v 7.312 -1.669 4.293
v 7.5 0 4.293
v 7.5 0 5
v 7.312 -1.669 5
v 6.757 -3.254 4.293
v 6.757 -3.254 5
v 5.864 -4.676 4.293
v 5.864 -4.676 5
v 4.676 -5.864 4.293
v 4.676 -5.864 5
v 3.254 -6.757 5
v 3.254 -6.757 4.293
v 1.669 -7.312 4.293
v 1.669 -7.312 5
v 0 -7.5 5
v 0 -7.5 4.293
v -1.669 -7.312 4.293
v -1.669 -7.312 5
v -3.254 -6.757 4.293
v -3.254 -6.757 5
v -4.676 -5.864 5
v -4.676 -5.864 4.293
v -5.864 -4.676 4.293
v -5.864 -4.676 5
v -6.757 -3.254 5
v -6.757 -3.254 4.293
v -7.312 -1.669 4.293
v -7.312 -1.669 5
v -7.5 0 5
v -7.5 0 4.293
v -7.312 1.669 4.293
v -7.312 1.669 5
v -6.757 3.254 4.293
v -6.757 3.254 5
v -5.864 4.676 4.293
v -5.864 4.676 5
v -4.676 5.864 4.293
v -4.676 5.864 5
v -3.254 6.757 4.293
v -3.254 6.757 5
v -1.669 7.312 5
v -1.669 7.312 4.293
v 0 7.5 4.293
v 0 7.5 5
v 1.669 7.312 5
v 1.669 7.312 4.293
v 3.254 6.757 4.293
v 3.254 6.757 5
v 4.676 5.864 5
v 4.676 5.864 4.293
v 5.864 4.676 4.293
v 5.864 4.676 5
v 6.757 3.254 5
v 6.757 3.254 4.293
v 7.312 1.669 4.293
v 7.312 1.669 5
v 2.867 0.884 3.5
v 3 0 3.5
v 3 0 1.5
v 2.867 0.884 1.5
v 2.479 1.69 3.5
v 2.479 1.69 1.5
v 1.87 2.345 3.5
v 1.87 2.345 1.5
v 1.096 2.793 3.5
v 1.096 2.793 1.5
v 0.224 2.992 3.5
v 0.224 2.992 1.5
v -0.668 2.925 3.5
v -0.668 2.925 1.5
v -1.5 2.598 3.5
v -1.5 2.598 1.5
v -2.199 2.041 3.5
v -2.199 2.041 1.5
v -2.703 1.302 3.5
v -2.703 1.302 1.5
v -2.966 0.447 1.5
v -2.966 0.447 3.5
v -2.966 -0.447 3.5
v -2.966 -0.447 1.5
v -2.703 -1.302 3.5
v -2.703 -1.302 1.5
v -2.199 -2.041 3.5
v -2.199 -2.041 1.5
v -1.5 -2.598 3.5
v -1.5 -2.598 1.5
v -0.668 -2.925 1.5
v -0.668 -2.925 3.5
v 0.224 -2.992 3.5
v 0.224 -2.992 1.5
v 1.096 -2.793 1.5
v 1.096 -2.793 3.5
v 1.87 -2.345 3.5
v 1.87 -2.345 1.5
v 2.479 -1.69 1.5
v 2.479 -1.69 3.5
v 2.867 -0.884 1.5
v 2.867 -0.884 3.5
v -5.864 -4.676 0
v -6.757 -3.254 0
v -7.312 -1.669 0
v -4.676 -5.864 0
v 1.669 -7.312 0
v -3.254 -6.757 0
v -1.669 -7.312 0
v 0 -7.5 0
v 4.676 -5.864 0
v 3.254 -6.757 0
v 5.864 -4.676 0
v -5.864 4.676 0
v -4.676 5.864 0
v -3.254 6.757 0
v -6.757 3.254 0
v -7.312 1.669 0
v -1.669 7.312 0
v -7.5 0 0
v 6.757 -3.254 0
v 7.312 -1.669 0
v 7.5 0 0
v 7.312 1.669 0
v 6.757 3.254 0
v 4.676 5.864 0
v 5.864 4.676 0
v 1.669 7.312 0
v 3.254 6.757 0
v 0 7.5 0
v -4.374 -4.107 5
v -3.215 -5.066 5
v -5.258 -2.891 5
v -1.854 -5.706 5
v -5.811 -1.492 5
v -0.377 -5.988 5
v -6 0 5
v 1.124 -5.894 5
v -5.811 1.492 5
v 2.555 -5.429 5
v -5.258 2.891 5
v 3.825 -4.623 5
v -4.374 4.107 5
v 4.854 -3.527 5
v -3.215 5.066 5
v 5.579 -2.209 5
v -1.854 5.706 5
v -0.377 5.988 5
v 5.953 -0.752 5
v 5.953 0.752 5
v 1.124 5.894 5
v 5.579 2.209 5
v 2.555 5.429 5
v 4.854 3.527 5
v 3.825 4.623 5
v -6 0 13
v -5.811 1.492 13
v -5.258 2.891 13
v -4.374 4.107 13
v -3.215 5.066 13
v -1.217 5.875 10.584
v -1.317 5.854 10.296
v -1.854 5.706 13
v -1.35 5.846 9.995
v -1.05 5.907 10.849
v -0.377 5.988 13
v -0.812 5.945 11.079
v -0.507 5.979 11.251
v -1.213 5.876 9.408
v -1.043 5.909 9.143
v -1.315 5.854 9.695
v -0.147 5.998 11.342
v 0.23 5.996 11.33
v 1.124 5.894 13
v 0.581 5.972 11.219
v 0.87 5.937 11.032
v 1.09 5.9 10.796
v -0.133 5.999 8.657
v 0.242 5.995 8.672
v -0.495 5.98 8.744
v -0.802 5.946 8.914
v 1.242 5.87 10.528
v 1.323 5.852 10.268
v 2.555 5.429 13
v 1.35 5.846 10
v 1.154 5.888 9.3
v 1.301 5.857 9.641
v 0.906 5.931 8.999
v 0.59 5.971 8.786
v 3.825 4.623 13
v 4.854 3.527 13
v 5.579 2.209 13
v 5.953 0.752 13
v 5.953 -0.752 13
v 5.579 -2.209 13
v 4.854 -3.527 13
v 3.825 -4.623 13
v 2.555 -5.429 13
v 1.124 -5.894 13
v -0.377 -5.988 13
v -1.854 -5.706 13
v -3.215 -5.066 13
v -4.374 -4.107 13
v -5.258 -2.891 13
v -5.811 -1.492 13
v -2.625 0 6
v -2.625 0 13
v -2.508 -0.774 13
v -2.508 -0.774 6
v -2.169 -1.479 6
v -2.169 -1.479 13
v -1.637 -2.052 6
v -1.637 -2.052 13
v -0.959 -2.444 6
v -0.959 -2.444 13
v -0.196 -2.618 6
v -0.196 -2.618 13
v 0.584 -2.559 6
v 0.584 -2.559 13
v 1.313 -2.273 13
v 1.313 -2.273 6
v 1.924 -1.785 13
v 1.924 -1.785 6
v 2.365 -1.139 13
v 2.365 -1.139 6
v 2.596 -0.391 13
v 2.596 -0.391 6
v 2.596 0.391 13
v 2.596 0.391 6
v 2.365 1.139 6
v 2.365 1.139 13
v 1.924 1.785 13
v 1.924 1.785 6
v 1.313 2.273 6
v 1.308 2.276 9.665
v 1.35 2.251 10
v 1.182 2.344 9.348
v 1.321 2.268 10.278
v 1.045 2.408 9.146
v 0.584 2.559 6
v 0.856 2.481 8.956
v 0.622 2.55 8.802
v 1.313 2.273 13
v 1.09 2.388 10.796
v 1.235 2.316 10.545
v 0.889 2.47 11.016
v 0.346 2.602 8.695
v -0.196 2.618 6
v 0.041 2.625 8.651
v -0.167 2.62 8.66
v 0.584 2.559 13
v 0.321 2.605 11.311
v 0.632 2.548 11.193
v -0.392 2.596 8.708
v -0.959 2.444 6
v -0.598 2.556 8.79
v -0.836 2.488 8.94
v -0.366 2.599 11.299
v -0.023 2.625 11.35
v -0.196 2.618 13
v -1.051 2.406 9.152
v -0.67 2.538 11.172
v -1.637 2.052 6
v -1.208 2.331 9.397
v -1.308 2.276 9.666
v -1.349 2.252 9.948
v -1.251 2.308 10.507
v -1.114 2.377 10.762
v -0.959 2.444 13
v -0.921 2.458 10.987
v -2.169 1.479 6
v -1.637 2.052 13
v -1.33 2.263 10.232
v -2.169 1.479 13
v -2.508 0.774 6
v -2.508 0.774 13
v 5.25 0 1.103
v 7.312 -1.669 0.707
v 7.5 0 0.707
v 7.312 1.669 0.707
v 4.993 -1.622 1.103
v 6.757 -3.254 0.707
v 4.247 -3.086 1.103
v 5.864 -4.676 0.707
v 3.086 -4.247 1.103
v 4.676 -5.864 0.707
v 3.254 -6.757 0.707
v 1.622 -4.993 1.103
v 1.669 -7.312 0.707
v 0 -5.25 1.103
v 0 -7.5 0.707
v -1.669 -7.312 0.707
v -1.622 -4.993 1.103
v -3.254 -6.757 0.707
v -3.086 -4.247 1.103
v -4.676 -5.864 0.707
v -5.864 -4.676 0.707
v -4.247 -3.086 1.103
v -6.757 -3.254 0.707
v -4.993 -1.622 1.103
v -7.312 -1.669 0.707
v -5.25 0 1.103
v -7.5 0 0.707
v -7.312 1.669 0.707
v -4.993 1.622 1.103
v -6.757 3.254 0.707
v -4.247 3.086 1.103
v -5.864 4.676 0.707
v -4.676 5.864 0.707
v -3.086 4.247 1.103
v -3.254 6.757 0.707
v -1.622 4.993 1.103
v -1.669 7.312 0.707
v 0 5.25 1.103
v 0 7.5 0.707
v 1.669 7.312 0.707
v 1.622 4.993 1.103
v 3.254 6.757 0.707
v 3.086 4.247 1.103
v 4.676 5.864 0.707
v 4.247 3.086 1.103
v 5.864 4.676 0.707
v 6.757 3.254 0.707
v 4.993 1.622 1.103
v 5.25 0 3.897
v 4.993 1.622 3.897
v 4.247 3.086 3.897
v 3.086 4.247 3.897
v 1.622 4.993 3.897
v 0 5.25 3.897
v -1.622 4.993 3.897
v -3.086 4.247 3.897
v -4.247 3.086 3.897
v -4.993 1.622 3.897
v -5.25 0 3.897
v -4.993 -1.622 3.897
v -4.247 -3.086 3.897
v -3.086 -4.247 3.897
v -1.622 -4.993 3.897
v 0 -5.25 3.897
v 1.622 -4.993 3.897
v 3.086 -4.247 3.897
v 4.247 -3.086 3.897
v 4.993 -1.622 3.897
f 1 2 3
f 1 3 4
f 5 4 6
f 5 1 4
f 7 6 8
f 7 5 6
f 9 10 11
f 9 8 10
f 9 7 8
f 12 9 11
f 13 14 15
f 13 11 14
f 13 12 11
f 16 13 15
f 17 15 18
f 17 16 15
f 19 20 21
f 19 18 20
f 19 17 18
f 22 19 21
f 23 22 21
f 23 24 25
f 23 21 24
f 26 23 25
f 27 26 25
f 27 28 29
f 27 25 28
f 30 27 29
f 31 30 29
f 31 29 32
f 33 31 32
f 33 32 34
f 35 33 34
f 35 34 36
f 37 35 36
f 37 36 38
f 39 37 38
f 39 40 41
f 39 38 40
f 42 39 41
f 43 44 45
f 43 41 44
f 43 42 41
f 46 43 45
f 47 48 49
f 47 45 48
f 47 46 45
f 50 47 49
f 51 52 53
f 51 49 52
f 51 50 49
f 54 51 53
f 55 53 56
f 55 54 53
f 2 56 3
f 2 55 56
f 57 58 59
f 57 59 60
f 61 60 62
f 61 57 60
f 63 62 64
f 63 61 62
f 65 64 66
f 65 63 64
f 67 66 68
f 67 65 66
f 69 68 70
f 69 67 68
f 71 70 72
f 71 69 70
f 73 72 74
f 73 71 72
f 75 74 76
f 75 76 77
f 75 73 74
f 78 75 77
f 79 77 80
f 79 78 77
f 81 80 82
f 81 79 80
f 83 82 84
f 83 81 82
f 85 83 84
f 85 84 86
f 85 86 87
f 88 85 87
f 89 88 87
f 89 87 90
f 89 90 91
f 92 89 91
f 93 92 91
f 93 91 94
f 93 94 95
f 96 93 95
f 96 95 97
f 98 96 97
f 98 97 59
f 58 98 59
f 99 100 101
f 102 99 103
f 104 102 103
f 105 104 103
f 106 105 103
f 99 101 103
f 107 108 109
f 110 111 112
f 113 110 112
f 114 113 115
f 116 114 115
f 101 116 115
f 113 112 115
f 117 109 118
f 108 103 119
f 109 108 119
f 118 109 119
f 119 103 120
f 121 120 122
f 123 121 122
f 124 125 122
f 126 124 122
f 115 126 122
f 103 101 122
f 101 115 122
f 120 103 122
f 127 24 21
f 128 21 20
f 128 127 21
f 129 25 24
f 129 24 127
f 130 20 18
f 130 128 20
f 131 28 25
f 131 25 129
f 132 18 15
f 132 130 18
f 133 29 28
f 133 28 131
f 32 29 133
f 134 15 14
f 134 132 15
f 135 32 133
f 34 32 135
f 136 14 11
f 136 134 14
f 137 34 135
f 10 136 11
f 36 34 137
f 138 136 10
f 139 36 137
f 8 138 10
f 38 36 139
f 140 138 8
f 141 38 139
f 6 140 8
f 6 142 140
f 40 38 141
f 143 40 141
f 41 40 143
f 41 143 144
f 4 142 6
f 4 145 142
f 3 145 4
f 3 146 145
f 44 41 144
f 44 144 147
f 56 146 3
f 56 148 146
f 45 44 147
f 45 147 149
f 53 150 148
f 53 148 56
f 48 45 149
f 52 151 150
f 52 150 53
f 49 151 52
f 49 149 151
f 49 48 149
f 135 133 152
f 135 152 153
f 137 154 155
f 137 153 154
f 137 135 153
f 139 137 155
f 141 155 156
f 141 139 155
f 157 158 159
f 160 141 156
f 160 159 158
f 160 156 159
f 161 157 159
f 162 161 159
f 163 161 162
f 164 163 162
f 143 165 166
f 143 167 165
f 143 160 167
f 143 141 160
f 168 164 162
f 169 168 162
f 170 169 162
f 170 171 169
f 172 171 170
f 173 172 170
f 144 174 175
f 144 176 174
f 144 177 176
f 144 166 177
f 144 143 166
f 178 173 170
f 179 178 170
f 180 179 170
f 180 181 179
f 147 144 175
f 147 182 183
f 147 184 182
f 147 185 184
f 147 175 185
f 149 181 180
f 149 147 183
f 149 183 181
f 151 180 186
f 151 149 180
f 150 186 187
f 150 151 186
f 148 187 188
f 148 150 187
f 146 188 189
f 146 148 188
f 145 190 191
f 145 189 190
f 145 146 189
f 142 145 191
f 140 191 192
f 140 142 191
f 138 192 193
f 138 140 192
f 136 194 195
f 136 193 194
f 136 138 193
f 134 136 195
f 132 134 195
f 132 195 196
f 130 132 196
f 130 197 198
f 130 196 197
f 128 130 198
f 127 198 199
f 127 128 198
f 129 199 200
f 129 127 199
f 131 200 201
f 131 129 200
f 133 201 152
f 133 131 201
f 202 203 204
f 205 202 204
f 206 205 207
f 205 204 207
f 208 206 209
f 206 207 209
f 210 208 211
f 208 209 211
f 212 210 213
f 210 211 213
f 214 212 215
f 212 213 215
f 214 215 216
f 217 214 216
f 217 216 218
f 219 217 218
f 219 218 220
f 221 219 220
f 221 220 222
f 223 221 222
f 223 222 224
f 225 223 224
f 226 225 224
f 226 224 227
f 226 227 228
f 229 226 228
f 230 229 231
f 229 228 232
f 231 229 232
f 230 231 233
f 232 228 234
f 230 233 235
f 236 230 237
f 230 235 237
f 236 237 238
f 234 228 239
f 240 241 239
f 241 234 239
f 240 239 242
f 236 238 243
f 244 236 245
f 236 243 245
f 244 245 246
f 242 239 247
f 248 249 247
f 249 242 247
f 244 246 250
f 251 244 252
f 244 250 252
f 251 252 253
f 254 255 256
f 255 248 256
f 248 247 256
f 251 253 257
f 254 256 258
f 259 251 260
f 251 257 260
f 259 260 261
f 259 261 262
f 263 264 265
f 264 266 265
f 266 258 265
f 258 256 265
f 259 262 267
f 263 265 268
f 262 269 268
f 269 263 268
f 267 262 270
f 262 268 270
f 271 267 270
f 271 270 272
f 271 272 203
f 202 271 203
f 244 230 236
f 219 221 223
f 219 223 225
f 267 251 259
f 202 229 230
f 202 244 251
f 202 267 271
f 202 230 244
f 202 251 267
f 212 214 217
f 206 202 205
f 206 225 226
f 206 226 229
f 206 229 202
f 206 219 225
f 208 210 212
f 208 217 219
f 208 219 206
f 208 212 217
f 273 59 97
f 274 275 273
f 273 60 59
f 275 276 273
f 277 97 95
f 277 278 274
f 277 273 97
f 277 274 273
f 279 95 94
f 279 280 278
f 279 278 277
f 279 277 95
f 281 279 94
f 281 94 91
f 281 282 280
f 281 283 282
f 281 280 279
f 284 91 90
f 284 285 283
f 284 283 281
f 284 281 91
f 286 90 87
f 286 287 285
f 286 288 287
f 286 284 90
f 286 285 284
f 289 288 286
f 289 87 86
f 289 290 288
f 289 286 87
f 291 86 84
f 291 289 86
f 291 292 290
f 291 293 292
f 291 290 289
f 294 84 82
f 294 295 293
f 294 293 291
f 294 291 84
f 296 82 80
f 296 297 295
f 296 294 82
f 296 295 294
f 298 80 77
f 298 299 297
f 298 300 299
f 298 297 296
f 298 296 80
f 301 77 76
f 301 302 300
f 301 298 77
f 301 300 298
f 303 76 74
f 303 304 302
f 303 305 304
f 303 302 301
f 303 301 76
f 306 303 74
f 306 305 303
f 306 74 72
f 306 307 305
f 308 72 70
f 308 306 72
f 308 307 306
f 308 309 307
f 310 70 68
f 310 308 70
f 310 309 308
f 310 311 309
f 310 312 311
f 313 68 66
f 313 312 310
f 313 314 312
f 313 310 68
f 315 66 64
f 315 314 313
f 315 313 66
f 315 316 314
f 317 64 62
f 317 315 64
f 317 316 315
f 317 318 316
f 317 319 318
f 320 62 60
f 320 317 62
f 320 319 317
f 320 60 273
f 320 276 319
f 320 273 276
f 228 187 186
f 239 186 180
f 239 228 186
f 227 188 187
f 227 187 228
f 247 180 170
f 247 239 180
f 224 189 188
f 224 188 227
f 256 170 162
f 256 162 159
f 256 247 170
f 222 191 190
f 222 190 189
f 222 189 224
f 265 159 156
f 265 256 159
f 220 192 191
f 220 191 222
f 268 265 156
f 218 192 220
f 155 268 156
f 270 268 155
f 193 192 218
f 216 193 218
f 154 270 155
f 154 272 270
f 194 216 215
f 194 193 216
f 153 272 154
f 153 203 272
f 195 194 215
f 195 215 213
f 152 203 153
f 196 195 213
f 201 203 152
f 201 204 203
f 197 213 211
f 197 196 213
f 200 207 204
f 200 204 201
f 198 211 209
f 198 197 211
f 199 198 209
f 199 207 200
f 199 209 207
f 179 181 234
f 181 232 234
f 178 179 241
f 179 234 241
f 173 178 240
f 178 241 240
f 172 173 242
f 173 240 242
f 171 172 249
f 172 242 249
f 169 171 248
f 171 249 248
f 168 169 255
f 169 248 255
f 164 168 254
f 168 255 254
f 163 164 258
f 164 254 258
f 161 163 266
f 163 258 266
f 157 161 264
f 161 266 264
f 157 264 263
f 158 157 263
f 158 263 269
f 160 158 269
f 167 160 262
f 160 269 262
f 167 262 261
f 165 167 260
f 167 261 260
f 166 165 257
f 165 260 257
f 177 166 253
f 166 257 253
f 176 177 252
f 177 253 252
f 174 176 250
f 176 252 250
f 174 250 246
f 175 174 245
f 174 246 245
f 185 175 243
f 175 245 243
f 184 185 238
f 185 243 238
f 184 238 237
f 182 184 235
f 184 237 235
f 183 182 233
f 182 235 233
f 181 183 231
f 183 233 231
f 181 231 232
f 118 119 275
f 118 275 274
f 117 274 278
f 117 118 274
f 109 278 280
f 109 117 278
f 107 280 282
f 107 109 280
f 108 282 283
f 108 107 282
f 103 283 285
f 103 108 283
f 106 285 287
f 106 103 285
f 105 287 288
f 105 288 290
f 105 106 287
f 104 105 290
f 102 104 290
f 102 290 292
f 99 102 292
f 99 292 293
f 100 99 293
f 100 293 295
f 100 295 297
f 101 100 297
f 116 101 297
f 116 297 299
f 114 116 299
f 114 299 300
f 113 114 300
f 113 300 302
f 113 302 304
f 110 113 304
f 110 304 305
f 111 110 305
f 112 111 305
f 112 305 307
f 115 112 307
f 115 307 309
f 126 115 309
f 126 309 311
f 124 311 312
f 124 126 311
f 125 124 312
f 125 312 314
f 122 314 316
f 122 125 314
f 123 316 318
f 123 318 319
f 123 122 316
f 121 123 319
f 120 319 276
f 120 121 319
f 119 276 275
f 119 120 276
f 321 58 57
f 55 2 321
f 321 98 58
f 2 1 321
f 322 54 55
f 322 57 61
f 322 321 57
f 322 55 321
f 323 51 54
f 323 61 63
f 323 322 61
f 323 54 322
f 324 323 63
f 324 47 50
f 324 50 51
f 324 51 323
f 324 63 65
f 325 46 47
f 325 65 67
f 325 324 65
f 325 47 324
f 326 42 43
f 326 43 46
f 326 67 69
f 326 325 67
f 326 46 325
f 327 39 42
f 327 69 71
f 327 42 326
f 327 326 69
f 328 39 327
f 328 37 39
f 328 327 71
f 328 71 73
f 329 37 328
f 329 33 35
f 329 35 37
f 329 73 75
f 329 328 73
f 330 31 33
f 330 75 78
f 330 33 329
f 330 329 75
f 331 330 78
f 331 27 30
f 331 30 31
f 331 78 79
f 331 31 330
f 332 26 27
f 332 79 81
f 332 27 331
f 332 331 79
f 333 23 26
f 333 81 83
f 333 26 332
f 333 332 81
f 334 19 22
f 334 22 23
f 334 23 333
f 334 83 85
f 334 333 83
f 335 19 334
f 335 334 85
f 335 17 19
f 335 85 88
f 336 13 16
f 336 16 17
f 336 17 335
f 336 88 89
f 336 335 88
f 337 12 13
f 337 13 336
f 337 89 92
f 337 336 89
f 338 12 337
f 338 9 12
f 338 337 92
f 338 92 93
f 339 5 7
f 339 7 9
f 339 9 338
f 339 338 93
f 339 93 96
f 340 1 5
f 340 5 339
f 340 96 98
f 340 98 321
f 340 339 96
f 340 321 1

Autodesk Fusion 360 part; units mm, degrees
sketch "Esquisse1" plane through (0, 0, 0) normal (0, 0, 1) x (1, 0, 0)
  circle A0 centre (0, 0) radius 7.5
  dimension "d1" = 15
extrude "Extrusion1" add sketch "Esquisse1" along normal blind 5
sketch "Esquisse2" plane through (0, 0, 0) normal (0, 1, 0) x (1, 0, 0)
sketch "Esquisse3" plane through (0, 0, 0) normal (0, 1, 0) x (1, 0, 0)
  line L0 (3, -3.5) -> (8.18, -4.4134)
  line L1 (8.18, -4.4134) -> (8.18, -0.5866)
  line L2 (8.18, -0.5866) -> (3, -1.5)
  line L3 (3, -1.5) -> (3, -3.5)
  line L4 (0, -1.75) -> (0, -22.5)
  dimension "d4" = 2
  dimension "d6" = 1.5
  dimension "d7" = 100
  dimension "d8" = 100
  dimension "d9" = 3
revolve "Révolution1" cut sketch "Esquisse3" angle 360 about axis through (0, 0, 1.75) along (0, 0, 1)
sketch "Esquisse4" plane through (0, 0, 5) normal (0, 0, 1) x (-1, 0, 0)
  circle A0 centre (0, 0) radius 7.5
  circle A1 centre (0, 0) radius 6
  dimension "d11" = 12
extrude "Extrusion2" add sketch "Esquisse4" along normal blind 8 contours A1
sketch "Esquisse5" plane through (0, 0, 13) normal (0, 0, 1) x (-1, 0, 0)
  circle A0 centre (0, 0) radius 6
  circle A1 centre (0, 0) radius 2.625
  dimension "d14" = 5.25
sketch "Esquisse6" plane through (0, 0, 13) normal (0, 0, 1) x (1, 0, 0)
extrude "Extrusion3" cut sketch "Esquisse5" against normal blind 7 contours A1
sketch "Esquisse7" plane through (0, 0, 0) normal (0, 1, 0) x (1, 0, 0)
  circle A0 centre (0, -10) radius 1.35
  line L0 (-6, -13) -> (6, -13)
  dimension "d17" = 2.7
  dimension "d18" = 3
extrude "Extrusion4" cut sketch "Esquisse7" along normal blind 15.5
